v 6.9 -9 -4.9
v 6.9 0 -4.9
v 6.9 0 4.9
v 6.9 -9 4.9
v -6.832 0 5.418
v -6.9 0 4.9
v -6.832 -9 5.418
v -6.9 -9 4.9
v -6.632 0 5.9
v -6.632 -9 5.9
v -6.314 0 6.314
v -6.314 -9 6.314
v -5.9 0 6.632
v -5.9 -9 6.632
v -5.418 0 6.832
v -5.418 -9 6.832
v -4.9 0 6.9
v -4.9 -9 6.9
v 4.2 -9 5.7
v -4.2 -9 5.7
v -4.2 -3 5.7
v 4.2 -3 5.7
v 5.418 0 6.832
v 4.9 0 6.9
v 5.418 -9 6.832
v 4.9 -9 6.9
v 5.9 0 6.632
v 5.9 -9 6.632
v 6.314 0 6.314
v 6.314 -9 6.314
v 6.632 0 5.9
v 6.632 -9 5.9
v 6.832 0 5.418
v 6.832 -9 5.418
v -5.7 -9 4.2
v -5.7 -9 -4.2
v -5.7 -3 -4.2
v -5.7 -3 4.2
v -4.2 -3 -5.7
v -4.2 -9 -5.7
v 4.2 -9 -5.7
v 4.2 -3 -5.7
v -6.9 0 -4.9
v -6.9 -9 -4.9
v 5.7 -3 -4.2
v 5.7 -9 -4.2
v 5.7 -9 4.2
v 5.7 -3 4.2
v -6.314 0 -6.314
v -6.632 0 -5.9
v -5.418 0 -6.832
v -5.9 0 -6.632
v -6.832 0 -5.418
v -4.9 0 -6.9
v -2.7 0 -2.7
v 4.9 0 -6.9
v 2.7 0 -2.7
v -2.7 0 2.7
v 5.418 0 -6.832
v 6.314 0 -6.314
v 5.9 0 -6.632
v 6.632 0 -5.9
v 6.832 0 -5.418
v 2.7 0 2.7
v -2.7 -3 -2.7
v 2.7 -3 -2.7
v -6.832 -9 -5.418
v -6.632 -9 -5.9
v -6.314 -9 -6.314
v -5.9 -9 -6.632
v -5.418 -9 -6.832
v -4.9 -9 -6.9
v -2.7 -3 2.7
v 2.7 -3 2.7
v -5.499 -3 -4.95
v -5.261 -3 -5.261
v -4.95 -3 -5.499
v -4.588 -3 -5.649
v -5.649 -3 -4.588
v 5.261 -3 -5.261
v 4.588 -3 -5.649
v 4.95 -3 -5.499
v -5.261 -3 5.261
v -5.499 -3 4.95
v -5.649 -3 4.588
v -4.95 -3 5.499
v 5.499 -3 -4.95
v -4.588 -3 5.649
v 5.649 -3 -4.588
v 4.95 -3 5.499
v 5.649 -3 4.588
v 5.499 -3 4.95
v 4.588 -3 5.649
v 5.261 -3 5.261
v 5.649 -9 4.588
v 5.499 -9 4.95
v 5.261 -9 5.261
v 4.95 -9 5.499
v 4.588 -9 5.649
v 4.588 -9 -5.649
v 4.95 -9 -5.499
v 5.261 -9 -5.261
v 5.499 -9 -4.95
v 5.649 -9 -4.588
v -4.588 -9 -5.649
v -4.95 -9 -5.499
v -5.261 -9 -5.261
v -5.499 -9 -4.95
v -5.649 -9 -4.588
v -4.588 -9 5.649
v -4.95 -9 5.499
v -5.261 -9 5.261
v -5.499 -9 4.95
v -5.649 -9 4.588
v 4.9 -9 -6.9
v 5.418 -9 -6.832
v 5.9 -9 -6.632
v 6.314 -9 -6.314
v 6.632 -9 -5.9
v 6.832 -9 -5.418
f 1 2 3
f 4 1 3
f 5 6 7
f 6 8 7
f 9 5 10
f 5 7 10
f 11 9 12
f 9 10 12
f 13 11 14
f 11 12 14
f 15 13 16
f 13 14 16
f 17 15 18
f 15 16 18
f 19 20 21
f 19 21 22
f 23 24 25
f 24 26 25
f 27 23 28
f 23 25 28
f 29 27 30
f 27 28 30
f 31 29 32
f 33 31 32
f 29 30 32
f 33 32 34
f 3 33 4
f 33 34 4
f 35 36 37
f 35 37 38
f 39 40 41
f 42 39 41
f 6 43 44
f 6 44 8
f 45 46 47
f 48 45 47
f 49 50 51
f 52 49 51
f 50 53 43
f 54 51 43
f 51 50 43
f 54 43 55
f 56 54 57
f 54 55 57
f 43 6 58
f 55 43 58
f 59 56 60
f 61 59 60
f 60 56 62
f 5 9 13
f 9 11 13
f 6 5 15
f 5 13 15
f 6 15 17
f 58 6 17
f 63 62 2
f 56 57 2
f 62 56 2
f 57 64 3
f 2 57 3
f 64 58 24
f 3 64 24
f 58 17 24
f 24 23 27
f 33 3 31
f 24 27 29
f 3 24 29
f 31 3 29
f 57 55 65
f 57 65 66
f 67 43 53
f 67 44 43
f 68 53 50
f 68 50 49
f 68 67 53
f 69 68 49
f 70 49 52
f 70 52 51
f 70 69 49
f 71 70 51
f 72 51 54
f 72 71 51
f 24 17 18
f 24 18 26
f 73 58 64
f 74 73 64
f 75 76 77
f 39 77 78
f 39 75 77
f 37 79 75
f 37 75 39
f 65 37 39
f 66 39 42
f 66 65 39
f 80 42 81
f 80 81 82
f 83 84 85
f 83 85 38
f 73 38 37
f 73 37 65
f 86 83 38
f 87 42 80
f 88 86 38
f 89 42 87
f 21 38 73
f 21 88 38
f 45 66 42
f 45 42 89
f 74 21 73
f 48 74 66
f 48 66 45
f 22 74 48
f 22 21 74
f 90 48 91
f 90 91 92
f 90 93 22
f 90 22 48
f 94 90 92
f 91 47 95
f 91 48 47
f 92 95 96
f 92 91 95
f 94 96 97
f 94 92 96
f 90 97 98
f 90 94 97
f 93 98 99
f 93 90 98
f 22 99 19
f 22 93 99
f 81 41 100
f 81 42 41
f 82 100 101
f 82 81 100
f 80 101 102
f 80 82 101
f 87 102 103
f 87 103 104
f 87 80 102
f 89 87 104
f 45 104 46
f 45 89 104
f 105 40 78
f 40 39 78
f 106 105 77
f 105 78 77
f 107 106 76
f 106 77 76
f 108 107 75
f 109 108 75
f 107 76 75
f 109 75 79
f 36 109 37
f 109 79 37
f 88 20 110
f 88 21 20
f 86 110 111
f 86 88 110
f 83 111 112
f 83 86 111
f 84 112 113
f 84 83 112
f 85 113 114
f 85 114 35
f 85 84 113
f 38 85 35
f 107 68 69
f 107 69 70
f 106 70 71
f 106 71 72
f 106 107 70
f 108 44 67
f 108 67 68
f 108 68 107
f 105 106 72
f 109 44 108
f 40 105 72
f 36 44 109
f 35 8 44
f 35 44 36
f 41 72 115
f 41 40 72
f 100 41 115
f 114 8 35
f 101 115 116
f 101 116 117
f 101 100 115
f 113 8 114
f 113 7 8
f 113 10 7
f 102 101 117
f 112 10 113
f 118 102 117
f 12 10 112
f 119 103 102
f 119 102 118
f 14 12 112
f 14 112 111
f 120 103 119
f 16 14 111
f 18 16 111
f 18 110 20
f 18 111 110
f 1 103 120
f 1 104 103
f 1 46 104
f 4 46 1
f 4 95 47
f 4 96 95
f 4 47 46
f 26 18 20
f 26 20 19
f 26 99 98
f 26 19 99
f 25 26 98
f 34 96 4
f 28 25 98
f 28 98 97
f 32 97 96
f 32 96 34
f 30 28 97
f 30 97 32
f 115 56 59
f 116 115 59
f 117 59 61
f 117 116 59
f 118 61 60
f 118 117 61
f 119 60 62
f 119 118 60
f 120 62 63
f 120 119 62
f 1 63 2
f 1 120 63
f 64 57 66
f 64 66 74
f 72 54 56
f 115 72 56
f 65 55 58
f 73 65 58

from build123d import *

# Parameters (mm, degrees)
F0_W     = 13.8
F0_H     = 13.8
F1_DEPTH = 9
F2_W     = 5.4
F2_H     = 5.4
F3_DEPTH = 9.001
F4_W     = 11.4
F4_H     = 11.4
F5_DEPTH = 6
F6_R     = 2
F7_R     = 1.5


with BuildPart() as f1:
    # F0 (on Front) → F1 (new body)
    with BuildSketch(Plane.XZ):
        Rectangle(F0_W, F0_H)
    extrude(amount=F1_DEPTH)

    # F2 (on Front) → F3 (cut, through all)
    with BuildSketch(Plane.XZ):
        Rectangle(F2_W, F2_H)
    extrude(amount=F3_DEPTH, mode=Mode.SUBTRACT)

    # F4 (on face) → F5 (cut)
    with BuildSketch(Plane.XZ.offset(9)):
        Rectangle(F4_W, F4_H)
    extrude(amount=-F5_DEPTH, mode=Mode.SUBTRACT)

    # F6
    f6_edges = [f1.edges().sort_by_distance(p)[0] for p in [
        (-6.9, -4.5, 6.9),
        (-6.9, -4.5, -6.9),
        (6.9, -4.5, 6.9),
        (6.9, -4.5, -6.9),
    ]]
    fillet(f6_edges, radius=F6_R)

    # F7
    f7_edges = [f1.edges().sort_by_distance(p)[0] for p in [
        (-5.7, -6, 5.7),
        (5.7, -6, 5.7),
        (-5.7, -6, -5.7),
        (5.7, -6, -5.7),
    ]]
    fillet(f7_edges, radius=F7_R)


solid = f1.part
